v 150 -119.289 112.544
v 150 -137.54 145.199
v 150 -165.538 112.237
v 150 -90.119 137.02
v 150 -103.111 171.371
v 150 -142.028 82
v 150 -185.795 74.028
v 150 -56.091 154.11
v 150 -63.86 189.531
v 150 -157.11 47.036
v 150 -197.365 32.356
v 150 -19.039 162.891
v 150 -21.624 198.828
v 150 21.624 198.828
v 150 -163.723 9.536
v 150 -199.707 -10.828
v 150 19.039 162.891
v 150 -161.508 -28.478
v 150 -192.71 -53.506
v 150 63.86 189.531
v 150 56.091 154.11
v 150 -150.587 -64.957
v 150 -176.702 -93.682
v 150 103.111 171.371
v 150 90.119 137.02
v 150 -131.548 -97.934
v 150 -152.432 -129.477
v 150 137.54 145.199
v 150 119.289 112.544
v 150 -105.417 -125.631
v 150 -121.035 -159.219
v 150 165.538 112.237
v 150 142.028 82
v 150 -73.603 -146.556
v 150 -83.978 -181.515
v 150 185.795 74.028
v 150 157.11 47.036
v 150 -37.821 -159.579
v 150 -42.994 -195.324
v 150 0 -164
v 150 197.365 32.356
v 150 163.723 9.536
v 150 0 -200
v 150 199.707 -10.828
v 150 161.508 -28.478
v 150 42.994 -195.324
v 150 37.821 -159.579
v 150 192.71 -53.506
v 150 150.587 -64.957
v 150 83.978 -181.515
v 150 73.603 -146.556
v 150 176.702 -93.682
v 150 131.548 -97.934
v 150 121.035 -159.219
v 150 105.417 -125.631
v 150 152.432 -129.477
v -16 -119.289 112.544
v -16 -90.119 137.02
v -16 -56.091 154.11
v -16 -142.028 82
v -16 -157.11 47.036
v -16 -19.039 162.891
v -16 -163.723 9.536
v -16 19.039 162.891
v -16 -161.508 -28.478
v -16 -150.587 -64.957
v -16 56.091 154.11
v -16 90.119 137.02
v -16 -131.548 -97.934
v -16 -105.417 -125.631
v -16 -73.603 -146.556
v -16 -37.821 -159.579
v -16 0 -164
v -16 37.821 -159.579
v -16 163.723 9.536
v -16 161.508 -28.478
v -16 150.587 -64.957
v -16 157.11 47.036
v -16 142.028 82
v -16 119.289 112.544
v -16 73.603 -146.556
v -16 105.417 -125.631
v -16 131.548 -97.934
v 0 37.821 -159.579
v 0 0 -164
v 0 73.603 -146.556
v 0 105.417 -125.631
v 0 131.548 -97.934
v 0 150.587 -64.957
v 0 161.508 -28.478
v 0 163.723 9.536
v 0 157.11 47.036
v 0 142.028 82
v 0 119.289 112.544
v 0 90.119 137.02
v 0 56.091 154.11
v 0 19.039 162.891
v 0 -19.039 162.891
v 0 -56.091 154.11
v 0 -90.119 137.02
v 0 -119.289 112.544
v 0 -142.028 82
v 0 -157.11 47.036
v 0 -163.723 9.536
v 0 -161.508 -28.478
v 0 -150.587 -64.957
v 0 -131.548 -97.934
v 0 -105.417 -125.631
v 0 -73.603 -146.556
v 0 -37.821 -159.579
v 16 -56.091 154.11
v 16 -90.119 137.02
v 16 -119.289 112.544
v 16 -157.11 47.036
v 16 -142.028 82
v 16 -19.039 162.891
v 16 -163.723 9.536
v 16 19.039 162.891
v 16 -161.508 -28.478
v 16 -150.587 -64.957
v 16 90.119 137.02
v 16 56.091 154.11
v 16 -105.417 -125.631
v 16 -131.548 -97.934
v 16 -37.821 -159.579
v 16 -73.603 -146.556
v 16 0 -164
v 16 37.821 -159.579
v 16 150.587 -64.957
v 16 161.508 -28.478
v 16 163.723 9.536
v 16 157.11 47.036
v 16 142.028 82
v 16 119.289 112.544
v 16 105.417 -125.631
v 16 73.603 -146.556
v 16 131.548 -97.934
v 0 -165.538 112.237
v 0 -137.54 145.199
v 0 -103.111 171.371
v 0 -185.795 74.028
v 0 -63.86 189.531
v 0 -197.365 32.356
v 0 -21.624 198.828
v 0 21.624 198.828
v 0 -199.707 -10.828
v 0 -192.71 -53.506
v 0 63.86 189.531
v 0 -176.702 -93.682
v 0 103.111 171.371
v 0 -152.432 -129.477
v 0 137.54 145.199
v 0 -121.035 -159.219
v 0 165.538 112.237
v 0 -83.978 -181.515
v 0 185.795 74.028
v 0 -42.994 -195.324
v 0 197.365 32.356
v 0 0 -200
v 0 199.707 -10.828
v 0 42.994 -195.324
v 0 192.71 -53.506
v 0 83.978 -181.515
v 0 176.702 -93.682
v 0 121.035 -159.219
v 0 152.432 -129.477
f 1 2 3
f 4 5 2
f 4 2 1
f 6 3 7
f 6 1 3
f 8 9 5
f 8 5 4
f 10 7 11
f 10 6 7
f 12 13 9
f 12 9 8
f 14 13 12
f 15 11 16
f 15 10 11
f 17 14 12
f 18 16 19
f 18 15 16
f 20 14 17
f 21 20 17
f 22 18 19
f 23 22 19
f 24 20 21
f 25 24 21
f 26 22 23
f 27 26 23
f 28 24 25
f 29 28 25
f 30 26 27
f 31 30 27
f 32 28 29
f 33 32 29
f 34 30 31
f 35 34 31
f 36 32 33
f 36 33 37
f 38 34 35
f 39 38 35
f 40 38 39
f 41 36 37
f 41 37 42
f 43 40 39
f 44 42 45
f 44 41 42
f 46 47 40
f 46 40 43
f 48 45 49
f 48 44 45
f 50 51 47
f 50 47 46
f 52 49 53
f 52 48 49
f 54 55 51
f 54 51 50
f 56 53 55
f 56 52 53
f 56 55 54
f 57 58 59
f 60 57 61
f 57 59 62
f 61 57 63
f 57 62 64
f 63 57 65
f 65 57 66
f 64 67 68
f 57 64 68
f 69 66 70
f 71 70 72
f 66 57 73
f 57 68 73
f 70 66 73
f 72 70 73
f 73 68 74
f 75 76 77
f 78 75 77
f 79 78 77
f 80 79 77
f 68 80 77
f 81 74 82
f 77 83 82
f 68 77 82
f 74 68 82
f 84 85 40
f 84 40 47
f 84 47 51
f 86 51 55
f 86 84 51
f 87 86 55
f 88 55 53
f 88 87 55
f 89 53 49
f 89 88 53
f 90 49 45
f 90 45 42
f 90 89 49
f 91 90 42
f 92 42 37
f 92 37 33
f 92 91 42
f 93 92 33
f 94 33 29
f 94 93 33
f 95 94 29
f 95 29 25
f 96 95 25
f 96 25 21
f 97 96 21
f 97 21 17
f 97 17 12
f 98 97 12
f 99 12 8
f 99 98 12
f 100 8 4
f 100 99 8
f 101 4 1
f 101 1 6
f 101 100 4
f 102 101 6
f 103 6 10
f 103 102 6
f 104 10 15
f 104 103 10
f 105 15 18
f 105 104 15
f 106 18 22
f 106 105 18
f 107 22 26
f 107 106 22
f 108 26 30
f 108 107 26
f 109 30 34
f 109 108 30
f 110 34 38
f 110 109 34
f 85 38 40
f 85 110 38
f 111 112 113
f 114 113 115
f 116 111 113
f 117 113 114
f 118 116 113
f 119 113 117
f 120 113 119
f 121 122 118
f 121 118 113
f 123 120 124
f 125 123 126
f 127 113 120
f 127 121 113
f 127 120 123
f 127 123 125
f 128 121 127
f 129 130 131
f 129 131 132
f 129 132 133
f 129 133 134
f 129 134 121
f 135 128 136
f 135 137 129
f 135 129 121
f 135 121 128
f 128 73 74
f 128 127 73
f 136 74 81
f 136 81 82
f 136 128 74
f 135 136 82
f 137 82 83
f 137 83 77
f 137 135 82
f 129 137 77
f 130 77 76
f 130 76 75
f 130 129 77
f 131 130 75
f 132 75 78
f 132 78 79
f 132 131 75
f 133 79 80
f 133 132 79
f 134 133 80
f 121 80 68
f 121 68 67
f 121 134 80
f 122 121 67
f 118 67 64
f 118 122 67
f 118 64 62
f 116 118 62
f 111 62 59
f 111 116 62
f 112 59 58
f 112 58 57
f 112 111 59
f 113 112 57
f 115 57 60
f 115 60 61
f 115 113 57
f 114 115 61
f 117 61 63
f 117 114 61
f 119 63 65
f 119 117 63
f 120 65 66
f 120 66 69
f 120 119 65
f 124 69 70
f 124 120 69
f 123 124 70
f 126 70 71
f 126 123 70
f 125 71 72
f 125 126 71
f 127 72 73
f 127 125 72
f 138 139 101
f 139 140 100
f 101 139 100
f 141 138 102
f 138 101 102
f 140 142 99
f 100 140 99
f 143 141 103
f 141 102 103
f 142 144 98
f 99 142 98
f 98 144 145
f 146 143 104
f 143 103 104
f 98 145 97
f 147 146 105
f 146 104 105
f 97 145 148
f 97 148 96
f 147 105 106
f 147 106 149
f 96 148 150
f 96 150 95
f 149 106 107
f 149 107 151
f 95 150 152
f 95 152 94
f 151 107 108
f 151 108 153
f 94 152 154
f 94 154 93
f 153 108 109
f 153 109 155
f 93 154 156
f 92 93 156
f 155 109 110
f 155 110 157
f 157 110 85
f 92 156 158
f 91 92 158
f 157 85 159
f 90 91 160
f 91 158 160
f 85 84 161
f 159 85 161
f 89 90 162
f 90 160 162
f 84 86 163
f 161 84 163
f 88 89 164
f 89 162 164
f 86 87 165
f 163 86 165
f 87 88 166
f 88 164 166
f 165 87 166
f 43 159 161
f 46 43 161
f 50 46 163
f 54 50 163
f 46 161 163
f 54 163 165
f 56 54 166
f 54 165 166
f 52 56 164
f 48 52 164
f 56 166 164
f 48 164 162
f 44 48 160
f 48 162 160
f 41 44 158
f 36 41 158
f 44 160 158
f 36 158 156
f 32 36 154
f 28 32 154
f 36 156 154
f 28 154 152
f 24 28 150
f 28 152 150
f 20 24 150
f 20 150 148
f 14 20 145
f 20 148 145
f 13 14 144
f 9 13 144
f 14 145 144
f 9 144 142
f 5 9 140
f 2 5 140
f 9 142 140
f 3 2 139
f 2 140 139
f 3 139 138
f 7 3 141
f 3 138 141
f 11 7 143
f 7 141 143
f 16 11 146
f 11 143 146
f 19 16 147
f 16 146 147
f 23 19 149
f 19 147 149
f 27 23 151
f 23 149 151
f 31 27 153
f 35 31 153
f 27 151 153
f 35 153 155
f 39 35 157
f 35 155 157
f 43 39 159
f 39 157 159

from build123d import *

# Parameters (mm, degrees)
SKETCH1_R                    = 164
ROTOR_VOLUME_EXTRUDE_DEPTH   = 16
SKETCH2_R                    = 200
SKETCH2_R_2                  = 164
DUCT_PACKAGING_EXTRUDE_DEPTH = 150


with BuildPart() as part:
    # Sketch1 → Rotor_Volume_Extrude (new, symmetric)
    with BuildSketch(Plane(origin=(0, 0, 0), x_dir=(0, 0, -1), z_dir=(1, 0, 0))):
        Circle(SKETCH1_R)
    extrude(amount=ROTOR_VOLUME_EXTRUDE_DEPTH, both=True)


with BuildPart() as body_2:
    # Sketch2 → Duct_Packaging_Extrude (new body)
    with BuildSketch(Plane(origin=(0, 0, 0), x_dir=(0, 0, -1), z_dir=(1, 0, 0))):
        Circle(SKETCH2_R)
        Circle(SKETCH2_R_2, mode=Mode.SUBTRACT)
    extrude(amount=DUCT_PACKAGING_EXTRUDE_DEPTH)


solid = Compound([part.part, body_2.part])
